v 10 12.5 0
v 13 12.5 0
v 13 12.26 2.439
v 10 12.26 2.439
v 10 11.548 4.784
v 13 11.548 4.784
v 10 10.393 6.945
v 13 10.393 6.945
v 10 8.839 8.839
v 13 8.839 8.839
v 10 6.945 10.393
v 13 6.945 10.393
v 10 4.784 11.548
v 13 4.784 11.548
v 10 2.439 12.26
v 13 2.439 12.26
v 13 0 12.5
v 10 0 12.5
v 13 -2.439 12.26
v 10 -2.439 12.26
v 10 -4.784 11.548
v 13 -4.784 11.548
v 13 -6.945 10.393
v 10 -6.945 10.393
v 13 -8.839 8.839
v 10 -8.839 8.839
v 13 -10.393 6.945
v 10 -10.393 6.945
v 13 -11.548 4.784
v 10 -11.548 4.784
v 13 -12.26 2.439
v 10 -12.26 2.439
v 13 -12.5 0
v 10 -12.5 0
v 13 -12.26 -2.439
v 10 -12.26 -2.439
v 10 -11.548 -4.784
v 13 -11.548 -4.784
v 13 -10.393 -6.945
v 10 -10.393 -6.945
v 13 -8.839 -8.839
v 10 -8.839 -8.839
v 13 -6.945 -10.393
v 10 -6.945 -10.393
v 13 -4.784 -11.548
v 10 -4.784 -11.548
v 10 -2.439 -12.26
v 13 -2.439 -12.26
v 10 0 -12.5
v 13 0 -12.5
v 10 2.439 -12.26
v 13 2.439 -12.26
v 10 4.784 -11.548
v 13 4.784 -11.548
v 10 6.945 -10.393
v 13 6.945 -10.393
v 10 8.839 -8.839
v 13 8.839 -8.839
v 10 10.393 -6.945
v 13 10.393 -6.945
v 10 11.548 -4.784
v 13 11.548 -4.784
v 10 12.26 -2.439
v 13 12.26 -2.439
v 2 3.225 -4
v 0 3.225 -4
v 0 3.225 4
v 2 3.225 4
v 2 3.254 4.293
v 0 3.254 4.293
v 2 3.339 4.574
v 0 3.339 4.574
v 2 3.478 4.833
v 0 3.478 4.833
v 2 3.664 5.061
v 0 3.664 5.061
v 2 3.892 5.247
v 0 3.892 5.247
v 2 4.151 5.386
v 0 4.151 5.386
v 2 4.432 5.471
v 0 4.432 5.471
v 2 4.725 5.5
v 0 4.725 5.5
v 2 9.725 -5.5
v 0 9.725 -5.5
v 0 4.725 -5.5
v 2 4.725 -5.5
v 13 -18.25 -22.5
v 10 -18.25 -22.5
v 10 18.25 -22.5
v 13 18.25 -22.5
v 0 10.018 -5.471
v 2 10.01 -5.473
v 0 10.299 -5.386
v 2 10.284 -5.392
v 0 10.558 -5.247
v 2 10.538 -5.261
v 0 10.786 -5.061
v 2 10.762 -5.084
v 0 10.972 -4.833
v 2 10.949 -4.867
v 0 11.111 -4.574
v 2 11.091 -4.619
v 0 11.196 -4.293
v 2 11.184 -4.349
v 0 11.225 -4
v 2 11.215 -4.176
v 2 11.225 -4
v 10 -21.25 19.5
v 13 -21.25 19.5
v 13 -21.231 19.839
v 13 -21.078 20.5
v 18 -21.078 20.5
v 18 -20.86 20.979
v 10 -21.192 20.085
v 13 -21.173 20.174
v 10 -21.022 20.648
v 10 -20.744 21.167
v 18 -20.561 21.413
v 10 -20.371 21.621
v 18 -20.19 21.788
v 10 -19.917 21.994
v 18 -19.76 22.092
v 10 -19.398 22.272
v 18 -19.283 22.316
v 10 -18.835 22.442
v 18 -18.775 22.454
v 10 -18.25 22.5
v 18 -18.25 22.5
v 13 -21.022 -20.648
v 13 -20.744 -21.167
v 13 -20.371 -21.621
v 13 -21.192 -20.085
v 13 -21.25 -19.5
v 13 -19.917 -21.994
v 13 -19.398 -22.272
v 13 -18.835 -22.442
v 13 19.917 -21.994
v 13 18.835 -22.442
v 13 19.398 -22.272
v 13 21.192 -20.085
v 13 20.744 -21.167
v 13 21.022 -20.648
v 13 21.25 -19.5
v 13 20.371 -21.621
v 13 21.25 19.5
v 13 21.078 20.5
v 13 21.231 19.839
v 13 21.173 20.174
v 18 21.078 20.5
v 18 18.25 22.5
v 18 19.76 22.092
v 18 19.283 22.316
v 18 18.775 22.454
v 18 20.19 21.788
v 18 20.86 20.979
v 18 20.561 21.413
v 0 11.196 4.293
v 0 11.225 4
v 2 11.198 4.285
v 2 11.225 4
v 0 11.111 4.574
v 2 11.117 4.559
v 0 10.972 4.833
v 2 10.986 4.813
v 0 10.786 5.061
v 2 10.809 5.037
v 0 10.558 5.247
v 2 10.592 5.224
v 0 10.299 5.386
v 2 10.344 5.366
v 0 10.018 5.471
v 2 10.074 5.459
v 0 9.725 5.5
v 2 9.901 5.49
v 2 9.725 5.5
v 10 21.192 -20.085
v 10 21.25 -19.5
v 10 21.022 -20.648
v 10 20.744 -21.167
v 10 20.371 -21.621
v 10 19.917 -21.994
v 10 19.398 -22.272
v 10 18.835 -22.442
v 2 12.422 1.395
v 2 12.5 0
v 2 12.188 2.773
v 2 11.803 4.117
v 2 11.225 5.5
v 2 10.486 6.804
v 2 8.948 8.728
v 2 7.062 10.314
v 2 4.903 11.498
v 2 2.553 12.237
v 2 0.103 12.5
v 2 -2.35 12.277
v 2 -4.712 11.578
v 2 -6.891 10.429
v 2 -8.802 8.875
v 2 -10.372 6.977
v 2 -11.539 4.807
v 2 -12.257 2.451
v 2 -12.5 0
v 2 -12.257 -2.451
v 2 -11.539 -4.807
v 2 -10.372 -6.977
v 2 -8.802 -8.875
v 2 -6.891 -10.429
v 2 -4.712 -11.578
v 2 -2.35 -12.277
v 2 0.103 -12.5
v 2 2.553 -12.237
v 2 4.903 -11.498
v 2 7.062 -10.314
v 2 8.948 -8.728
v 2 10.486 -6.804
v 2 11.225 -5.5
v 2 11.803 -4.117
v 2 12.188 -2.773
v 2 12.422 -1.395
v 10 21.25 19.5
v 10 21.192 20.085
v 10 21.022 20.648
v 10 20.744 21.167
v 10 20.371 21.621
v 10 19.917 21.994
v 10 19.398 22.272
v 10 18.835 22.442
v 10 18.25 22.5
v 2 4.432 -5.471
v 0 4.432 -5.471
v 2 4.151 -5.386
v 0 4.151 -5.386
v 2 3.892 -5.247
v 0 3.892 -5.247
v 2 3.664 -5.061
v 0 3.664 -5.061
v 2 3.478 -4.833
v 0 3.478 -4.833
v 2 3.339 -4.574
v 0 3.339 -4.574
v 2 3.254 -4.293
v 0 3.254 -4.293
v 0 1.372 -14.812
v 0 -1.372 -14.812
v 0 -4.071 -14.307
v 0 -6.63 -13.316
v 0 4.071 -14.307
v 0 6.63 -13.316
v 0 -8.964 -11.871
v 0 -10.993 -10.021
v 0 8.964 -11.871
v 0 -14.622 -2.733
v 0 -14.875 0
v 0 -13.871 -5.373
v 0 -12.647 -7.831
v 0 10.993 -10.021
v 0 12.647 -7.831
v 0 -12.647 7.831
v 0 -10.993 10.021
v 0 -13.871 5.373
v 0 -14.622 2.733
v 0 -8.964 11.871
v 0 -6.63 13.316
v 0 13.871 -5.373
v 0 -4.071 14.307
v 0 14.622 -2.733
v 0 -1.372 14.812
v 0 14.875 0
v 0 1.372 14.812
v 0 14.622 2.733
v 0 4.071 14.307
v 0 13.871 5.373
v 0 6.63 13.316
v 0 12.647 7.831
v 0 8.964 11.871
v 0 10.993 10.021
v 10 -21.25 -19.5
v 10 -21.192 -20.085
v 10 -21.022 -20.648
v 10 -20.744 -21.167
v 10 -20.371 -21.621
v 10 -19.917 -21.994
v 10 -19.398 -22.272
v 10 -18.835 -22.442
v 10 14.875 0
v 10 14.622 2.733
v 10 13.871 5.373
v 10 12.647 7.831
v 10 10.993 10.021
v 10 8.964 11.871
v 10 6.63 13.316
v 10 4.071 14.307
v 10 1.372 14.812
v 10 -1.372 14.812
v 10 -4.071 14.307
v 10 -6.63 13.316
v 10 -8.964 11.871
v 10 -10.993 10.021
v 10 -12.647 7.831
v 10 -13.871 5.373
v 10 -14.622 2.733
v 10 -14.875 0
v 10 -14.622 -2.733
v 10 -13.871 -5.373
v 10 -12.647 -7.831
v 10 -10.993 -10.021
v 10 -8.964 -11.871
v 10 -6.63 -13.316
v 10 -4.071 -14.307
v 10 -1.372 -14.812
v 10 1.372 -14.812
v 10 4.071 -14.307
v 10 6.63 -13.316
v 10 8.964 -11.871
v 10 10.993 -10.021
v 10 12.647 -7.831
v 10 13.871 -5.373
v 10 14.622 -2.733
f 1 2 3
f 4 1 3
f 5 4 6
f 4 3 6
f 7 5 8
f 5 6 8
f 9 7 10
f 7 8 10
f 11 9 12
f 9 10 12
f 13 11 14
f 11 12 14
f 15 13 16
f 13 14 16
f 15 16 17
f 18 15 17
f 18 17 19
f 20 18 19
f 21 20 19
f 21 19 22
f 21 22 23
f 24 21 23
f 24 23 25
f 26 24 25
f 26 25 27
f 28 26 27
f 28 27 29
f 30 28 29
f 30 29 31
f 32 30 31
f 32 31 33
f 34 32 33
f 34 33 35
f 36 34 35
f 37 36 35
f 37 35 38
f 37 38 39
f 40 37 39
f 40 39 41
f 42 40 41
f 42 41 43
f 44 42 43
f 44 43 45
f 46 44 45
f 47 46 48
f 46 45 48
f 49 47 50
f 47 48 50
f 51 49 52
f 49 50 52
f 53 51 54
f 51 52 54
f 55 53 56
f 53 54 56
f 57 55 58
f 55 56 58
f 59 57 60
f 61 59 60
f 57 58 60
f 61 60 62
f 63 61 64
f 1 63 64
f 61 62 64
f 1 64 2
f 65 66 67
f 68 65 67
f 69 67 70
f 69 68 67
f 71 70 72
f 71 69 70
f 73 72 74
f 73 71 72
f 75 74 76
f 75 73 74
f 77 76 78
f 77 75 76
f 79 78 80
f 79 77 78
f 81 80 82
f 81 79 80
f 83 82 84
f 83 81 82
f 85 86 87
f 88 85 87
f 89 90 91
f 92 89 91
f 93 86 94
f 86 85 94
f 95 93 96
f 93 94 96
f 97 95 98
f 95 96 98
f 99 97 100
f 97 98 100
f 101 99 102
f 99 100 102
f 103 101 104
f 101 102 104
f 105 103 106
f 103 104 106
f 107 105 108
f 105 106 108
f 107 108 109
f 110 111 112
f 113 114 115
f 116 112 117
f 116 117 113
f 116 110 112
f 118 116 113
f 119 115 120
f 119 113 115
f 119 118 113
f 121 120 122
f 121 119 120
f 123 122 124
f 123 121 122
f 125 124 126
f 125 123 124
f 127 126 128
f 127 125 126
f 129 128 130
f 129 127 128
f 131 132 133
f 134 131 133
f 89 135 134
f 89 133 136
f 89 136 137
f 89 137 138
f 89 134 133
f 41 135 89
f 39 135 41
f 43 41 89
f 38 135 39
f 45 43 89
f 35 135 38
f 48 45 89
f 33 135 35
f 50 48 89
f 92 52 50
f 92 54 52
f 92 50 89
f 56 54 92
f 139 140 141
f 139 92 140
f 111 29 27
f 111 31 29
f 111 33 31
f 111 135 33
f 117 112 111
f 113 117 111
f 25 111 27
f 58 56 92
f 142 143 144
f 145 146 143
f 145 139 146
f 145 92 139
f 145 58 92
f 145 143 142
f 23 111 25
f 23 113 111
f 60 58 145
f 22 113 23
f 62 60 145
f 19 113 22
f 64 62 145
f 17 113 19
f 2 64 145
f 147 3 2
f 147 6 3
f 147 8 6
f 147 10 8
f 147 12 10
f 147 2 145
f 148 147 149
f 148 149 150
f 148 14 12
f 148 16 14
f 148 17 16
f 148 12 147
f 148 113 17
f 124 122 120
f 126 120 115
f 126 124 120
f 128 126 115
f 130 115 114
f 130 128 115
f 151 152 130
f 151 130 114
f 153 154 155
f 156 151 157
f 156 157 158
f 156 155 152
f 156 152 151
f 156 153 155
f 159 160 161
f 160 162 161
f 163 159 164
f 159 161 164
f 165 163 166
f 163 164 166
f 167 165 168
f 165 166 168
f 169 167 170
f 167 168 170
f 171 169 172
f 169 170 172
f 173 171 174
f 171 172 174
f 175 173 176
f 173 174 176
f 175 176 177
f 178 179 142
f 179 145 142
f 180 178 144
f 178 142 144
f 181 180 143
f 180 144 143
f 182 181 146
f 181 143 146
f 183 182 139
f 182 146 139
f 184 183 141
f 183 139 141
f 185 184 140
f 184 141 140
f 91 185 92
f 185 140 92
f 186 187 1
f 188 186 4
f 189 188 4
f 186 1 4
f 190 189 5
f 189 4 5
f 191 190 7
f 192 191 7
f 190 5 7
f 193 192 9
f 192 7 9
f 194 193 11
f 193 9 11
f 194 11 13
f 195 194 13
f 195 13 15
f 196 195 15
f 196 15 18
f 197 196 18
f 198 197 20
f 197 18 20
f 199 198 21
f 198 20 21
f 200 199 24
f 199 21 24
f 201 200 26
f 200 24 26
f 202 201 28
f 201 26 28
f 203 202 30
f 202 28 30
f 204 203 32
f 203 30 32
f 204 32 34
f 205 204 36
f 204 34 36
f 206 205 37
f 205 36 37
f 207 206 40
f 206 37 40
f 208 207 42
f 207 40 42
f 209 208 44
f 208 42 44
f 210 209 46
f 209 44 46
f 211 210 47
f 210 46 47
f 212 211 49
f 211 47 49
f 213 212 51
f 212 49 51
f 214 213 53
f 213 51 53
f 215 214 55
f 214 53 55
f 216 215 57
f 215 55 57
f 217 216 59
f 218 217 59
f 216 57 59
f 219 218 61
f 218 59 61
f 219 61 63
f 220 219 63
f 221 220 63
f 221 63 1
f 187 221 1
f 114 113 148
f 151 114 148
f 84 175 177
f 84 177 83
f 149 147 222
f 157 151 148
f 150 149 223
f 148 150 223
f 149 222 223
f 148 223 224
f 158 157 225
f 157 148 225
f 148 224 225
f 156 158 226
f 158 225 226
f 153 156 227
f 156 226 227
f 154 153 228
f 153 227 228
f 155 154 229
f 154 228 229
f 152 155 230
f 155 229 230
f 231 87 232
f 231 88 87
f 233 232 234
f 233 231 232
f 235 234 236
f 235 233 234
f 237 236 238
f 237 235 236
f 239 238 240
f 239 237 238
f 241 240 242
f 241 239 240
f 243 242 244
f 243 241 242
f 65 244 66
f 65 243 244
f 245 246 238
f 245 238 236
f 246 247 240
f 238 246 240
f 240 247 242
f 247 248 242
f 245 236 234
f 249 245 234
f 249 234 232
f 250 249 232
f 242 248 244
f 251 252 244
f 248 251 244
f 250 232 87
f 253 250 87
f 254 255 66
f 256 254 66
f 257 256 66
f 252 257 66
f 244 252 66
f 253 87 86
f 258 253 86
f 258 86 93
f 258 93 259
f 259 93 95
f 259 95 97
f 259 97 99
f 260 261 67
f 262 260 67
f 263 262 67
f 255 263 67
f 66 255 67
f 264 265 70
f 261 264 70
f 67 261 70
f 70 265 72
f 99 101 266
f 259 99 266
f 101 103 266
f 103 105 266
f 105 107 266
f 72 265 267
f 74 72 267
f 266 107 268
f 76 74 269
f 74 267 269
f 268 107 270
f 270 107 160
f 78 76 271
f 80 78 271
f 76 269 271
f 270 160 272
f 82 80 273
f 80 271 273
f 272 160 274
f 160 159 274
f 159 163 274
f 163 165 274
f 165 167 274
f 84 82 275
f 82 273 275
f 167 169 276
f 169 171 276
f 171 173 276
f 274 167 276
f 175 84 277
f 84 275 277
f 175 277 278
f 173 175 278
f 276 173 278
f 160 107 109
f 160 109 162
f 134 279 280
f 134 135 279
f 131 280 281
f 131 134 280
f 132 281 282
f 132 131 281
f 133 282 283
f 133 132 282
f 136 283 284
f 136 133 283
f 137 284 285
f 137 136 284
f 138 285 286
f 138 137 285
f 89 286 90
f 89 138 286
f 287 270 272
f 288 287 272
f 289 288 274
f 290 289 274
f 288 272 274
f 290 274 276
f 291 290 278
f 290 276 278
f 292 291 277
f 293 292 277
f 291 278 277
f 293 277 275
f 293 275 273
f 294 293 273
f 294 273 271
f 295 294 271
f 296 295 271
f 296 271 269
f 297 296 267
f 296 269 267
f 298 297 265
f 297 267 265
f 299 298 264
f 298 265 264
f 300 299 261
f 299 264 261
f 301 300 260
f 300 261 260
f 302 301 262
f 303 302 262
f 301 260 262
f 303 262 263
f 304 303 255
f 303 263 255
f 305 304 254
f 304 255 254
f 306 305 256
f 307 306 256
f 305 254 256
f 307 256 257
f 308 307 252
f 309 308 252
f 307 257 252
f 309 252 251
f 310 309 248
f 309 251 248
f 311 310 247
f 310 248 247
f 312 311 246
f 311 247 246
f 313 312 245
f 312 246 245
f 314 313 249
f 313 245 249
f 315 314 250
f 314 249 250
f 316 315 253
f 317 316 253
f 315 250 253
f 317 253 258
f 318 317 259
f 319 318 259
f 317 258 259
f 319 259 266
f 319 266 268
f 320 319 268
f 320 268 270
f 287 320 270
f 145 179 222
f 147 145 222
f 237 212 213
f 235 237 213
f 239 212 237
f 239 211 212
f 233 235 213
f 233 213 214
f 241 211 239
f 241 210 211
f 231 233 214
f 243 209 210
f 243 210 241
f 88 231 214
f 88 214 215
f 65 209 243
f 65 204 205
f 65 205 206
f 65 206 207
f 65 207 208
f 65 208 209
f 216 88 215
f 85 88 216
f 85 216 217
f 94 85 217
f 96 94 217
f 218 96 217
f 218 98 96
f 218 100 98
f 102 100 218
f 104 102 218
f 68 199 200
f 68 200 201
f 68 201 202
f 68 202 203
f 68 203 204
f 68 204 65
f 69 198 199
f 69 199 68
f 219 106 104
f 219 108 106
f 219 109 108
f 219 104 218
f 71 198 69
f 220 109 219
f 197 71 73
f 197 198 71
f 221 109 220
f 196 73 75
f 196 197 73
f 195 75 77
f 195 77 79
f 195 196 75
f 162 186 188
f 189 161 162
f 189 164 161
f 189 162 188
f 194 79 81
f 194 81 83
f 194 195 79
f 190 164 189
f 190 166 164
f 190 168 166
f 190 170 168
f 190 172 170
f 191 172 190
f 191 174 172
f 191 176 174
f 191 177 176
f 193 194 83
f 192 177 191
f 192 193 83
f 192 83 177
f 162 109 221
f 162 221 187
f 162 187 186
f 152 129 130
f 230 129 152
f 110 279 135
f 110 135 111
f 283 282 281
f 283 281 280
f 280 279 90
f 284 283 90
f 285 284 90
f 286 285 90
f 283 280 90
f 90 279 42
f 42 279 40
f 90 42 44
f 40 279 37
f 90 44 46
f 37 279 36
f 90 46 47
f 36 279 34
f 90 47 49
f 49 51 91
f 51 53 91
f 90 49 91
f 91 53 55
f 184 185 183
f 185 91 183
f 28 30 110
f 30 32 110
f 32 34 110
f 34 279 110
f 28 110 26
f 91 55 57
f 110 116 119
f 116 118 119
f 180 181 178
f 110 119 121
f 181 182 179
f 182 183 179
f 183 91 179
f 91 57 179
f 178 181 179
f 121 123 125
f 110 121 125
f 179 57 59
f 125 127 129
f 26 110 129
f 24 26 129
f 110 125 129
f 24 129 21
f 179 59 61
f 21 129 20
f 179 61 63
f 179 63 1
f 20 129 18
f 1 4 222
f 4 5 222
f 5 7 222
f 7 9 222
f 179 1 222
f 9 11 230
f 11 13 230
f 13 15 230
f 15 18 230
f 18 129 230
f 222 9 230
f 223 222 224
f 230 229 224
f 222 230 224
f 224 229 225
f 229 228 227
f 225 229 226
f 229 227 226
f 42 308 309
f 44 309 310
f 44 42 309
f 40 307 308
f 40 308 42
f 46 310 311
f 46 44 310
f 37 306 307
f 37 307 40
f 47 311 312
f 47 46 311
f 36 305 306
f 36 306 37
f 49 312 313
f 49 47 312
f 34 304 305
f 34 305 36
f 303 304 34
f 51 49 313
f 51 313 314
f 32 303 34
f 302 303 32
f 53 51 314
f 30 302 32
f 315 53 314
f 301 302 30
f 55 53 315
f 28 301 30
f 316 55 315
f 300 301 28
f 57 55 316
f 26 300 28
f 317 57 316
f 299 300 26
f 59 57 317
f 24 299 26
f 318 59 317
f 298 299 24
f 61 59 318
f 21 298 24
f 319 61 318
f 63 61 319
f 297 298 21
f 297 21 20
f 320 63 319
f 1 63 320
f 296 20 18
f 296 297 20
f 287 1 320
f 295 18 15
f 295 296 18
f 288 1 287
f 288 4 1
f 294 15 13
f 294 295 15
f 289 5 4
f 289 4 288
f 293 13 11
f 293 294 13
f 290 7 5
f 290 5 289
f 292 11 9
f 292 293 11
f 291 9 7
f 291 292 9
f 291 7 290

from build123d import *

# Parameters (mm, degrees)
F0_R     = 14.875
F1_DEPTH = 10
F2_W     = 42.5
F2_H     = 45
F2_R     = 14.875
F3_DEPTH = 3
F4_R     = 12.5
F5_DEPTH = 11
F6_W     = 8
F6_H     = 11
F7_DEPTH = 13.001
F8_W     = 42.5
F8_H     = 2
F9_DEPTH = 5
F10_R    = 3
F11_R    = 1.5


with BuildPart() as f1:
    # F0 (on Right) → F1 (new body)
    with BuildSketch(Plane.YZ):
        Circle(F0_R)
    extrude(amount=F1_DEPTH)


with BuildPart() as f3:
    # F2 (on face) → F3 (new body)
    with BuildSketch(Plane.YZ.offset(10)):
        Rectangle(F2_W, F2_H)
        Circle(F2_R, mode=Mode.SUBTRACT)
        Circle(F2_R)
    extrude(amount=F3_DEPTH)


with BuildPart() as f5_tool:
    # F4 (on face) → F5 (new body)
    with BuildSketch(Plane.YZ.offset(13)):
        Circle(F4_R)
    extrude(amount=-F5_DEPTH)


with BuildPart() as f1_1:
    add(f1.part)

    # F5: cut by f5_tool
    add(f5_tool.part, mode=Mode.SUBTRACT)

    # F6 (on face) → F7 (cut, through all)
    with BuildSketch(Plane(origin=(0, 0, 0), x_dir=(0, -1, 0), z_dir=(-1, 0, 0))):
        with Locations((-7.224972, 0)):
            Rectangle(F6_W, F6_H)
    extrude(amount=-F7_DEPTH, mode=Mode.SUBTRACT)

    # F11
    f11_edges = [f1_1.edges().sort_by_distance(p)[0] for p in [
        (1, 11.224972, 5.5),
        (1, 3.224972, 5.5),
        (1, 3.224972, -5.5),
        (1, 11.224972, -5.5),
    ]]
    fillet(f11_edges, radius=F11_R)


with BuildPart() as f3_1:
    add(f3.part)

    # F5: cut by f5_tool
    add(f5_tool.part, mode=Mode.SUBTRACT)

    # F8 (on face) → F9 (join)
    with BuildSketch(Plane.YZ.offset(13)):
        with Locations((0, 21.5)):
            Rectangle(F8_W, F8_H)
    extrude(amount=F9_DEPTH)

    # F10
    f10_edges = [f3_1.edges().sort_by_distance(p)[0] for p in [
        (14, -21.25, 22.5),
        (11.5, -21.25, -22.5),
        (14, 21.25, 22.5),
        (11.5, 21.25, -22.5),
    ]]
    fillet(f10_edges, radius=F10_R)


solid = Compound([f1_1.part, f3_1.part])
